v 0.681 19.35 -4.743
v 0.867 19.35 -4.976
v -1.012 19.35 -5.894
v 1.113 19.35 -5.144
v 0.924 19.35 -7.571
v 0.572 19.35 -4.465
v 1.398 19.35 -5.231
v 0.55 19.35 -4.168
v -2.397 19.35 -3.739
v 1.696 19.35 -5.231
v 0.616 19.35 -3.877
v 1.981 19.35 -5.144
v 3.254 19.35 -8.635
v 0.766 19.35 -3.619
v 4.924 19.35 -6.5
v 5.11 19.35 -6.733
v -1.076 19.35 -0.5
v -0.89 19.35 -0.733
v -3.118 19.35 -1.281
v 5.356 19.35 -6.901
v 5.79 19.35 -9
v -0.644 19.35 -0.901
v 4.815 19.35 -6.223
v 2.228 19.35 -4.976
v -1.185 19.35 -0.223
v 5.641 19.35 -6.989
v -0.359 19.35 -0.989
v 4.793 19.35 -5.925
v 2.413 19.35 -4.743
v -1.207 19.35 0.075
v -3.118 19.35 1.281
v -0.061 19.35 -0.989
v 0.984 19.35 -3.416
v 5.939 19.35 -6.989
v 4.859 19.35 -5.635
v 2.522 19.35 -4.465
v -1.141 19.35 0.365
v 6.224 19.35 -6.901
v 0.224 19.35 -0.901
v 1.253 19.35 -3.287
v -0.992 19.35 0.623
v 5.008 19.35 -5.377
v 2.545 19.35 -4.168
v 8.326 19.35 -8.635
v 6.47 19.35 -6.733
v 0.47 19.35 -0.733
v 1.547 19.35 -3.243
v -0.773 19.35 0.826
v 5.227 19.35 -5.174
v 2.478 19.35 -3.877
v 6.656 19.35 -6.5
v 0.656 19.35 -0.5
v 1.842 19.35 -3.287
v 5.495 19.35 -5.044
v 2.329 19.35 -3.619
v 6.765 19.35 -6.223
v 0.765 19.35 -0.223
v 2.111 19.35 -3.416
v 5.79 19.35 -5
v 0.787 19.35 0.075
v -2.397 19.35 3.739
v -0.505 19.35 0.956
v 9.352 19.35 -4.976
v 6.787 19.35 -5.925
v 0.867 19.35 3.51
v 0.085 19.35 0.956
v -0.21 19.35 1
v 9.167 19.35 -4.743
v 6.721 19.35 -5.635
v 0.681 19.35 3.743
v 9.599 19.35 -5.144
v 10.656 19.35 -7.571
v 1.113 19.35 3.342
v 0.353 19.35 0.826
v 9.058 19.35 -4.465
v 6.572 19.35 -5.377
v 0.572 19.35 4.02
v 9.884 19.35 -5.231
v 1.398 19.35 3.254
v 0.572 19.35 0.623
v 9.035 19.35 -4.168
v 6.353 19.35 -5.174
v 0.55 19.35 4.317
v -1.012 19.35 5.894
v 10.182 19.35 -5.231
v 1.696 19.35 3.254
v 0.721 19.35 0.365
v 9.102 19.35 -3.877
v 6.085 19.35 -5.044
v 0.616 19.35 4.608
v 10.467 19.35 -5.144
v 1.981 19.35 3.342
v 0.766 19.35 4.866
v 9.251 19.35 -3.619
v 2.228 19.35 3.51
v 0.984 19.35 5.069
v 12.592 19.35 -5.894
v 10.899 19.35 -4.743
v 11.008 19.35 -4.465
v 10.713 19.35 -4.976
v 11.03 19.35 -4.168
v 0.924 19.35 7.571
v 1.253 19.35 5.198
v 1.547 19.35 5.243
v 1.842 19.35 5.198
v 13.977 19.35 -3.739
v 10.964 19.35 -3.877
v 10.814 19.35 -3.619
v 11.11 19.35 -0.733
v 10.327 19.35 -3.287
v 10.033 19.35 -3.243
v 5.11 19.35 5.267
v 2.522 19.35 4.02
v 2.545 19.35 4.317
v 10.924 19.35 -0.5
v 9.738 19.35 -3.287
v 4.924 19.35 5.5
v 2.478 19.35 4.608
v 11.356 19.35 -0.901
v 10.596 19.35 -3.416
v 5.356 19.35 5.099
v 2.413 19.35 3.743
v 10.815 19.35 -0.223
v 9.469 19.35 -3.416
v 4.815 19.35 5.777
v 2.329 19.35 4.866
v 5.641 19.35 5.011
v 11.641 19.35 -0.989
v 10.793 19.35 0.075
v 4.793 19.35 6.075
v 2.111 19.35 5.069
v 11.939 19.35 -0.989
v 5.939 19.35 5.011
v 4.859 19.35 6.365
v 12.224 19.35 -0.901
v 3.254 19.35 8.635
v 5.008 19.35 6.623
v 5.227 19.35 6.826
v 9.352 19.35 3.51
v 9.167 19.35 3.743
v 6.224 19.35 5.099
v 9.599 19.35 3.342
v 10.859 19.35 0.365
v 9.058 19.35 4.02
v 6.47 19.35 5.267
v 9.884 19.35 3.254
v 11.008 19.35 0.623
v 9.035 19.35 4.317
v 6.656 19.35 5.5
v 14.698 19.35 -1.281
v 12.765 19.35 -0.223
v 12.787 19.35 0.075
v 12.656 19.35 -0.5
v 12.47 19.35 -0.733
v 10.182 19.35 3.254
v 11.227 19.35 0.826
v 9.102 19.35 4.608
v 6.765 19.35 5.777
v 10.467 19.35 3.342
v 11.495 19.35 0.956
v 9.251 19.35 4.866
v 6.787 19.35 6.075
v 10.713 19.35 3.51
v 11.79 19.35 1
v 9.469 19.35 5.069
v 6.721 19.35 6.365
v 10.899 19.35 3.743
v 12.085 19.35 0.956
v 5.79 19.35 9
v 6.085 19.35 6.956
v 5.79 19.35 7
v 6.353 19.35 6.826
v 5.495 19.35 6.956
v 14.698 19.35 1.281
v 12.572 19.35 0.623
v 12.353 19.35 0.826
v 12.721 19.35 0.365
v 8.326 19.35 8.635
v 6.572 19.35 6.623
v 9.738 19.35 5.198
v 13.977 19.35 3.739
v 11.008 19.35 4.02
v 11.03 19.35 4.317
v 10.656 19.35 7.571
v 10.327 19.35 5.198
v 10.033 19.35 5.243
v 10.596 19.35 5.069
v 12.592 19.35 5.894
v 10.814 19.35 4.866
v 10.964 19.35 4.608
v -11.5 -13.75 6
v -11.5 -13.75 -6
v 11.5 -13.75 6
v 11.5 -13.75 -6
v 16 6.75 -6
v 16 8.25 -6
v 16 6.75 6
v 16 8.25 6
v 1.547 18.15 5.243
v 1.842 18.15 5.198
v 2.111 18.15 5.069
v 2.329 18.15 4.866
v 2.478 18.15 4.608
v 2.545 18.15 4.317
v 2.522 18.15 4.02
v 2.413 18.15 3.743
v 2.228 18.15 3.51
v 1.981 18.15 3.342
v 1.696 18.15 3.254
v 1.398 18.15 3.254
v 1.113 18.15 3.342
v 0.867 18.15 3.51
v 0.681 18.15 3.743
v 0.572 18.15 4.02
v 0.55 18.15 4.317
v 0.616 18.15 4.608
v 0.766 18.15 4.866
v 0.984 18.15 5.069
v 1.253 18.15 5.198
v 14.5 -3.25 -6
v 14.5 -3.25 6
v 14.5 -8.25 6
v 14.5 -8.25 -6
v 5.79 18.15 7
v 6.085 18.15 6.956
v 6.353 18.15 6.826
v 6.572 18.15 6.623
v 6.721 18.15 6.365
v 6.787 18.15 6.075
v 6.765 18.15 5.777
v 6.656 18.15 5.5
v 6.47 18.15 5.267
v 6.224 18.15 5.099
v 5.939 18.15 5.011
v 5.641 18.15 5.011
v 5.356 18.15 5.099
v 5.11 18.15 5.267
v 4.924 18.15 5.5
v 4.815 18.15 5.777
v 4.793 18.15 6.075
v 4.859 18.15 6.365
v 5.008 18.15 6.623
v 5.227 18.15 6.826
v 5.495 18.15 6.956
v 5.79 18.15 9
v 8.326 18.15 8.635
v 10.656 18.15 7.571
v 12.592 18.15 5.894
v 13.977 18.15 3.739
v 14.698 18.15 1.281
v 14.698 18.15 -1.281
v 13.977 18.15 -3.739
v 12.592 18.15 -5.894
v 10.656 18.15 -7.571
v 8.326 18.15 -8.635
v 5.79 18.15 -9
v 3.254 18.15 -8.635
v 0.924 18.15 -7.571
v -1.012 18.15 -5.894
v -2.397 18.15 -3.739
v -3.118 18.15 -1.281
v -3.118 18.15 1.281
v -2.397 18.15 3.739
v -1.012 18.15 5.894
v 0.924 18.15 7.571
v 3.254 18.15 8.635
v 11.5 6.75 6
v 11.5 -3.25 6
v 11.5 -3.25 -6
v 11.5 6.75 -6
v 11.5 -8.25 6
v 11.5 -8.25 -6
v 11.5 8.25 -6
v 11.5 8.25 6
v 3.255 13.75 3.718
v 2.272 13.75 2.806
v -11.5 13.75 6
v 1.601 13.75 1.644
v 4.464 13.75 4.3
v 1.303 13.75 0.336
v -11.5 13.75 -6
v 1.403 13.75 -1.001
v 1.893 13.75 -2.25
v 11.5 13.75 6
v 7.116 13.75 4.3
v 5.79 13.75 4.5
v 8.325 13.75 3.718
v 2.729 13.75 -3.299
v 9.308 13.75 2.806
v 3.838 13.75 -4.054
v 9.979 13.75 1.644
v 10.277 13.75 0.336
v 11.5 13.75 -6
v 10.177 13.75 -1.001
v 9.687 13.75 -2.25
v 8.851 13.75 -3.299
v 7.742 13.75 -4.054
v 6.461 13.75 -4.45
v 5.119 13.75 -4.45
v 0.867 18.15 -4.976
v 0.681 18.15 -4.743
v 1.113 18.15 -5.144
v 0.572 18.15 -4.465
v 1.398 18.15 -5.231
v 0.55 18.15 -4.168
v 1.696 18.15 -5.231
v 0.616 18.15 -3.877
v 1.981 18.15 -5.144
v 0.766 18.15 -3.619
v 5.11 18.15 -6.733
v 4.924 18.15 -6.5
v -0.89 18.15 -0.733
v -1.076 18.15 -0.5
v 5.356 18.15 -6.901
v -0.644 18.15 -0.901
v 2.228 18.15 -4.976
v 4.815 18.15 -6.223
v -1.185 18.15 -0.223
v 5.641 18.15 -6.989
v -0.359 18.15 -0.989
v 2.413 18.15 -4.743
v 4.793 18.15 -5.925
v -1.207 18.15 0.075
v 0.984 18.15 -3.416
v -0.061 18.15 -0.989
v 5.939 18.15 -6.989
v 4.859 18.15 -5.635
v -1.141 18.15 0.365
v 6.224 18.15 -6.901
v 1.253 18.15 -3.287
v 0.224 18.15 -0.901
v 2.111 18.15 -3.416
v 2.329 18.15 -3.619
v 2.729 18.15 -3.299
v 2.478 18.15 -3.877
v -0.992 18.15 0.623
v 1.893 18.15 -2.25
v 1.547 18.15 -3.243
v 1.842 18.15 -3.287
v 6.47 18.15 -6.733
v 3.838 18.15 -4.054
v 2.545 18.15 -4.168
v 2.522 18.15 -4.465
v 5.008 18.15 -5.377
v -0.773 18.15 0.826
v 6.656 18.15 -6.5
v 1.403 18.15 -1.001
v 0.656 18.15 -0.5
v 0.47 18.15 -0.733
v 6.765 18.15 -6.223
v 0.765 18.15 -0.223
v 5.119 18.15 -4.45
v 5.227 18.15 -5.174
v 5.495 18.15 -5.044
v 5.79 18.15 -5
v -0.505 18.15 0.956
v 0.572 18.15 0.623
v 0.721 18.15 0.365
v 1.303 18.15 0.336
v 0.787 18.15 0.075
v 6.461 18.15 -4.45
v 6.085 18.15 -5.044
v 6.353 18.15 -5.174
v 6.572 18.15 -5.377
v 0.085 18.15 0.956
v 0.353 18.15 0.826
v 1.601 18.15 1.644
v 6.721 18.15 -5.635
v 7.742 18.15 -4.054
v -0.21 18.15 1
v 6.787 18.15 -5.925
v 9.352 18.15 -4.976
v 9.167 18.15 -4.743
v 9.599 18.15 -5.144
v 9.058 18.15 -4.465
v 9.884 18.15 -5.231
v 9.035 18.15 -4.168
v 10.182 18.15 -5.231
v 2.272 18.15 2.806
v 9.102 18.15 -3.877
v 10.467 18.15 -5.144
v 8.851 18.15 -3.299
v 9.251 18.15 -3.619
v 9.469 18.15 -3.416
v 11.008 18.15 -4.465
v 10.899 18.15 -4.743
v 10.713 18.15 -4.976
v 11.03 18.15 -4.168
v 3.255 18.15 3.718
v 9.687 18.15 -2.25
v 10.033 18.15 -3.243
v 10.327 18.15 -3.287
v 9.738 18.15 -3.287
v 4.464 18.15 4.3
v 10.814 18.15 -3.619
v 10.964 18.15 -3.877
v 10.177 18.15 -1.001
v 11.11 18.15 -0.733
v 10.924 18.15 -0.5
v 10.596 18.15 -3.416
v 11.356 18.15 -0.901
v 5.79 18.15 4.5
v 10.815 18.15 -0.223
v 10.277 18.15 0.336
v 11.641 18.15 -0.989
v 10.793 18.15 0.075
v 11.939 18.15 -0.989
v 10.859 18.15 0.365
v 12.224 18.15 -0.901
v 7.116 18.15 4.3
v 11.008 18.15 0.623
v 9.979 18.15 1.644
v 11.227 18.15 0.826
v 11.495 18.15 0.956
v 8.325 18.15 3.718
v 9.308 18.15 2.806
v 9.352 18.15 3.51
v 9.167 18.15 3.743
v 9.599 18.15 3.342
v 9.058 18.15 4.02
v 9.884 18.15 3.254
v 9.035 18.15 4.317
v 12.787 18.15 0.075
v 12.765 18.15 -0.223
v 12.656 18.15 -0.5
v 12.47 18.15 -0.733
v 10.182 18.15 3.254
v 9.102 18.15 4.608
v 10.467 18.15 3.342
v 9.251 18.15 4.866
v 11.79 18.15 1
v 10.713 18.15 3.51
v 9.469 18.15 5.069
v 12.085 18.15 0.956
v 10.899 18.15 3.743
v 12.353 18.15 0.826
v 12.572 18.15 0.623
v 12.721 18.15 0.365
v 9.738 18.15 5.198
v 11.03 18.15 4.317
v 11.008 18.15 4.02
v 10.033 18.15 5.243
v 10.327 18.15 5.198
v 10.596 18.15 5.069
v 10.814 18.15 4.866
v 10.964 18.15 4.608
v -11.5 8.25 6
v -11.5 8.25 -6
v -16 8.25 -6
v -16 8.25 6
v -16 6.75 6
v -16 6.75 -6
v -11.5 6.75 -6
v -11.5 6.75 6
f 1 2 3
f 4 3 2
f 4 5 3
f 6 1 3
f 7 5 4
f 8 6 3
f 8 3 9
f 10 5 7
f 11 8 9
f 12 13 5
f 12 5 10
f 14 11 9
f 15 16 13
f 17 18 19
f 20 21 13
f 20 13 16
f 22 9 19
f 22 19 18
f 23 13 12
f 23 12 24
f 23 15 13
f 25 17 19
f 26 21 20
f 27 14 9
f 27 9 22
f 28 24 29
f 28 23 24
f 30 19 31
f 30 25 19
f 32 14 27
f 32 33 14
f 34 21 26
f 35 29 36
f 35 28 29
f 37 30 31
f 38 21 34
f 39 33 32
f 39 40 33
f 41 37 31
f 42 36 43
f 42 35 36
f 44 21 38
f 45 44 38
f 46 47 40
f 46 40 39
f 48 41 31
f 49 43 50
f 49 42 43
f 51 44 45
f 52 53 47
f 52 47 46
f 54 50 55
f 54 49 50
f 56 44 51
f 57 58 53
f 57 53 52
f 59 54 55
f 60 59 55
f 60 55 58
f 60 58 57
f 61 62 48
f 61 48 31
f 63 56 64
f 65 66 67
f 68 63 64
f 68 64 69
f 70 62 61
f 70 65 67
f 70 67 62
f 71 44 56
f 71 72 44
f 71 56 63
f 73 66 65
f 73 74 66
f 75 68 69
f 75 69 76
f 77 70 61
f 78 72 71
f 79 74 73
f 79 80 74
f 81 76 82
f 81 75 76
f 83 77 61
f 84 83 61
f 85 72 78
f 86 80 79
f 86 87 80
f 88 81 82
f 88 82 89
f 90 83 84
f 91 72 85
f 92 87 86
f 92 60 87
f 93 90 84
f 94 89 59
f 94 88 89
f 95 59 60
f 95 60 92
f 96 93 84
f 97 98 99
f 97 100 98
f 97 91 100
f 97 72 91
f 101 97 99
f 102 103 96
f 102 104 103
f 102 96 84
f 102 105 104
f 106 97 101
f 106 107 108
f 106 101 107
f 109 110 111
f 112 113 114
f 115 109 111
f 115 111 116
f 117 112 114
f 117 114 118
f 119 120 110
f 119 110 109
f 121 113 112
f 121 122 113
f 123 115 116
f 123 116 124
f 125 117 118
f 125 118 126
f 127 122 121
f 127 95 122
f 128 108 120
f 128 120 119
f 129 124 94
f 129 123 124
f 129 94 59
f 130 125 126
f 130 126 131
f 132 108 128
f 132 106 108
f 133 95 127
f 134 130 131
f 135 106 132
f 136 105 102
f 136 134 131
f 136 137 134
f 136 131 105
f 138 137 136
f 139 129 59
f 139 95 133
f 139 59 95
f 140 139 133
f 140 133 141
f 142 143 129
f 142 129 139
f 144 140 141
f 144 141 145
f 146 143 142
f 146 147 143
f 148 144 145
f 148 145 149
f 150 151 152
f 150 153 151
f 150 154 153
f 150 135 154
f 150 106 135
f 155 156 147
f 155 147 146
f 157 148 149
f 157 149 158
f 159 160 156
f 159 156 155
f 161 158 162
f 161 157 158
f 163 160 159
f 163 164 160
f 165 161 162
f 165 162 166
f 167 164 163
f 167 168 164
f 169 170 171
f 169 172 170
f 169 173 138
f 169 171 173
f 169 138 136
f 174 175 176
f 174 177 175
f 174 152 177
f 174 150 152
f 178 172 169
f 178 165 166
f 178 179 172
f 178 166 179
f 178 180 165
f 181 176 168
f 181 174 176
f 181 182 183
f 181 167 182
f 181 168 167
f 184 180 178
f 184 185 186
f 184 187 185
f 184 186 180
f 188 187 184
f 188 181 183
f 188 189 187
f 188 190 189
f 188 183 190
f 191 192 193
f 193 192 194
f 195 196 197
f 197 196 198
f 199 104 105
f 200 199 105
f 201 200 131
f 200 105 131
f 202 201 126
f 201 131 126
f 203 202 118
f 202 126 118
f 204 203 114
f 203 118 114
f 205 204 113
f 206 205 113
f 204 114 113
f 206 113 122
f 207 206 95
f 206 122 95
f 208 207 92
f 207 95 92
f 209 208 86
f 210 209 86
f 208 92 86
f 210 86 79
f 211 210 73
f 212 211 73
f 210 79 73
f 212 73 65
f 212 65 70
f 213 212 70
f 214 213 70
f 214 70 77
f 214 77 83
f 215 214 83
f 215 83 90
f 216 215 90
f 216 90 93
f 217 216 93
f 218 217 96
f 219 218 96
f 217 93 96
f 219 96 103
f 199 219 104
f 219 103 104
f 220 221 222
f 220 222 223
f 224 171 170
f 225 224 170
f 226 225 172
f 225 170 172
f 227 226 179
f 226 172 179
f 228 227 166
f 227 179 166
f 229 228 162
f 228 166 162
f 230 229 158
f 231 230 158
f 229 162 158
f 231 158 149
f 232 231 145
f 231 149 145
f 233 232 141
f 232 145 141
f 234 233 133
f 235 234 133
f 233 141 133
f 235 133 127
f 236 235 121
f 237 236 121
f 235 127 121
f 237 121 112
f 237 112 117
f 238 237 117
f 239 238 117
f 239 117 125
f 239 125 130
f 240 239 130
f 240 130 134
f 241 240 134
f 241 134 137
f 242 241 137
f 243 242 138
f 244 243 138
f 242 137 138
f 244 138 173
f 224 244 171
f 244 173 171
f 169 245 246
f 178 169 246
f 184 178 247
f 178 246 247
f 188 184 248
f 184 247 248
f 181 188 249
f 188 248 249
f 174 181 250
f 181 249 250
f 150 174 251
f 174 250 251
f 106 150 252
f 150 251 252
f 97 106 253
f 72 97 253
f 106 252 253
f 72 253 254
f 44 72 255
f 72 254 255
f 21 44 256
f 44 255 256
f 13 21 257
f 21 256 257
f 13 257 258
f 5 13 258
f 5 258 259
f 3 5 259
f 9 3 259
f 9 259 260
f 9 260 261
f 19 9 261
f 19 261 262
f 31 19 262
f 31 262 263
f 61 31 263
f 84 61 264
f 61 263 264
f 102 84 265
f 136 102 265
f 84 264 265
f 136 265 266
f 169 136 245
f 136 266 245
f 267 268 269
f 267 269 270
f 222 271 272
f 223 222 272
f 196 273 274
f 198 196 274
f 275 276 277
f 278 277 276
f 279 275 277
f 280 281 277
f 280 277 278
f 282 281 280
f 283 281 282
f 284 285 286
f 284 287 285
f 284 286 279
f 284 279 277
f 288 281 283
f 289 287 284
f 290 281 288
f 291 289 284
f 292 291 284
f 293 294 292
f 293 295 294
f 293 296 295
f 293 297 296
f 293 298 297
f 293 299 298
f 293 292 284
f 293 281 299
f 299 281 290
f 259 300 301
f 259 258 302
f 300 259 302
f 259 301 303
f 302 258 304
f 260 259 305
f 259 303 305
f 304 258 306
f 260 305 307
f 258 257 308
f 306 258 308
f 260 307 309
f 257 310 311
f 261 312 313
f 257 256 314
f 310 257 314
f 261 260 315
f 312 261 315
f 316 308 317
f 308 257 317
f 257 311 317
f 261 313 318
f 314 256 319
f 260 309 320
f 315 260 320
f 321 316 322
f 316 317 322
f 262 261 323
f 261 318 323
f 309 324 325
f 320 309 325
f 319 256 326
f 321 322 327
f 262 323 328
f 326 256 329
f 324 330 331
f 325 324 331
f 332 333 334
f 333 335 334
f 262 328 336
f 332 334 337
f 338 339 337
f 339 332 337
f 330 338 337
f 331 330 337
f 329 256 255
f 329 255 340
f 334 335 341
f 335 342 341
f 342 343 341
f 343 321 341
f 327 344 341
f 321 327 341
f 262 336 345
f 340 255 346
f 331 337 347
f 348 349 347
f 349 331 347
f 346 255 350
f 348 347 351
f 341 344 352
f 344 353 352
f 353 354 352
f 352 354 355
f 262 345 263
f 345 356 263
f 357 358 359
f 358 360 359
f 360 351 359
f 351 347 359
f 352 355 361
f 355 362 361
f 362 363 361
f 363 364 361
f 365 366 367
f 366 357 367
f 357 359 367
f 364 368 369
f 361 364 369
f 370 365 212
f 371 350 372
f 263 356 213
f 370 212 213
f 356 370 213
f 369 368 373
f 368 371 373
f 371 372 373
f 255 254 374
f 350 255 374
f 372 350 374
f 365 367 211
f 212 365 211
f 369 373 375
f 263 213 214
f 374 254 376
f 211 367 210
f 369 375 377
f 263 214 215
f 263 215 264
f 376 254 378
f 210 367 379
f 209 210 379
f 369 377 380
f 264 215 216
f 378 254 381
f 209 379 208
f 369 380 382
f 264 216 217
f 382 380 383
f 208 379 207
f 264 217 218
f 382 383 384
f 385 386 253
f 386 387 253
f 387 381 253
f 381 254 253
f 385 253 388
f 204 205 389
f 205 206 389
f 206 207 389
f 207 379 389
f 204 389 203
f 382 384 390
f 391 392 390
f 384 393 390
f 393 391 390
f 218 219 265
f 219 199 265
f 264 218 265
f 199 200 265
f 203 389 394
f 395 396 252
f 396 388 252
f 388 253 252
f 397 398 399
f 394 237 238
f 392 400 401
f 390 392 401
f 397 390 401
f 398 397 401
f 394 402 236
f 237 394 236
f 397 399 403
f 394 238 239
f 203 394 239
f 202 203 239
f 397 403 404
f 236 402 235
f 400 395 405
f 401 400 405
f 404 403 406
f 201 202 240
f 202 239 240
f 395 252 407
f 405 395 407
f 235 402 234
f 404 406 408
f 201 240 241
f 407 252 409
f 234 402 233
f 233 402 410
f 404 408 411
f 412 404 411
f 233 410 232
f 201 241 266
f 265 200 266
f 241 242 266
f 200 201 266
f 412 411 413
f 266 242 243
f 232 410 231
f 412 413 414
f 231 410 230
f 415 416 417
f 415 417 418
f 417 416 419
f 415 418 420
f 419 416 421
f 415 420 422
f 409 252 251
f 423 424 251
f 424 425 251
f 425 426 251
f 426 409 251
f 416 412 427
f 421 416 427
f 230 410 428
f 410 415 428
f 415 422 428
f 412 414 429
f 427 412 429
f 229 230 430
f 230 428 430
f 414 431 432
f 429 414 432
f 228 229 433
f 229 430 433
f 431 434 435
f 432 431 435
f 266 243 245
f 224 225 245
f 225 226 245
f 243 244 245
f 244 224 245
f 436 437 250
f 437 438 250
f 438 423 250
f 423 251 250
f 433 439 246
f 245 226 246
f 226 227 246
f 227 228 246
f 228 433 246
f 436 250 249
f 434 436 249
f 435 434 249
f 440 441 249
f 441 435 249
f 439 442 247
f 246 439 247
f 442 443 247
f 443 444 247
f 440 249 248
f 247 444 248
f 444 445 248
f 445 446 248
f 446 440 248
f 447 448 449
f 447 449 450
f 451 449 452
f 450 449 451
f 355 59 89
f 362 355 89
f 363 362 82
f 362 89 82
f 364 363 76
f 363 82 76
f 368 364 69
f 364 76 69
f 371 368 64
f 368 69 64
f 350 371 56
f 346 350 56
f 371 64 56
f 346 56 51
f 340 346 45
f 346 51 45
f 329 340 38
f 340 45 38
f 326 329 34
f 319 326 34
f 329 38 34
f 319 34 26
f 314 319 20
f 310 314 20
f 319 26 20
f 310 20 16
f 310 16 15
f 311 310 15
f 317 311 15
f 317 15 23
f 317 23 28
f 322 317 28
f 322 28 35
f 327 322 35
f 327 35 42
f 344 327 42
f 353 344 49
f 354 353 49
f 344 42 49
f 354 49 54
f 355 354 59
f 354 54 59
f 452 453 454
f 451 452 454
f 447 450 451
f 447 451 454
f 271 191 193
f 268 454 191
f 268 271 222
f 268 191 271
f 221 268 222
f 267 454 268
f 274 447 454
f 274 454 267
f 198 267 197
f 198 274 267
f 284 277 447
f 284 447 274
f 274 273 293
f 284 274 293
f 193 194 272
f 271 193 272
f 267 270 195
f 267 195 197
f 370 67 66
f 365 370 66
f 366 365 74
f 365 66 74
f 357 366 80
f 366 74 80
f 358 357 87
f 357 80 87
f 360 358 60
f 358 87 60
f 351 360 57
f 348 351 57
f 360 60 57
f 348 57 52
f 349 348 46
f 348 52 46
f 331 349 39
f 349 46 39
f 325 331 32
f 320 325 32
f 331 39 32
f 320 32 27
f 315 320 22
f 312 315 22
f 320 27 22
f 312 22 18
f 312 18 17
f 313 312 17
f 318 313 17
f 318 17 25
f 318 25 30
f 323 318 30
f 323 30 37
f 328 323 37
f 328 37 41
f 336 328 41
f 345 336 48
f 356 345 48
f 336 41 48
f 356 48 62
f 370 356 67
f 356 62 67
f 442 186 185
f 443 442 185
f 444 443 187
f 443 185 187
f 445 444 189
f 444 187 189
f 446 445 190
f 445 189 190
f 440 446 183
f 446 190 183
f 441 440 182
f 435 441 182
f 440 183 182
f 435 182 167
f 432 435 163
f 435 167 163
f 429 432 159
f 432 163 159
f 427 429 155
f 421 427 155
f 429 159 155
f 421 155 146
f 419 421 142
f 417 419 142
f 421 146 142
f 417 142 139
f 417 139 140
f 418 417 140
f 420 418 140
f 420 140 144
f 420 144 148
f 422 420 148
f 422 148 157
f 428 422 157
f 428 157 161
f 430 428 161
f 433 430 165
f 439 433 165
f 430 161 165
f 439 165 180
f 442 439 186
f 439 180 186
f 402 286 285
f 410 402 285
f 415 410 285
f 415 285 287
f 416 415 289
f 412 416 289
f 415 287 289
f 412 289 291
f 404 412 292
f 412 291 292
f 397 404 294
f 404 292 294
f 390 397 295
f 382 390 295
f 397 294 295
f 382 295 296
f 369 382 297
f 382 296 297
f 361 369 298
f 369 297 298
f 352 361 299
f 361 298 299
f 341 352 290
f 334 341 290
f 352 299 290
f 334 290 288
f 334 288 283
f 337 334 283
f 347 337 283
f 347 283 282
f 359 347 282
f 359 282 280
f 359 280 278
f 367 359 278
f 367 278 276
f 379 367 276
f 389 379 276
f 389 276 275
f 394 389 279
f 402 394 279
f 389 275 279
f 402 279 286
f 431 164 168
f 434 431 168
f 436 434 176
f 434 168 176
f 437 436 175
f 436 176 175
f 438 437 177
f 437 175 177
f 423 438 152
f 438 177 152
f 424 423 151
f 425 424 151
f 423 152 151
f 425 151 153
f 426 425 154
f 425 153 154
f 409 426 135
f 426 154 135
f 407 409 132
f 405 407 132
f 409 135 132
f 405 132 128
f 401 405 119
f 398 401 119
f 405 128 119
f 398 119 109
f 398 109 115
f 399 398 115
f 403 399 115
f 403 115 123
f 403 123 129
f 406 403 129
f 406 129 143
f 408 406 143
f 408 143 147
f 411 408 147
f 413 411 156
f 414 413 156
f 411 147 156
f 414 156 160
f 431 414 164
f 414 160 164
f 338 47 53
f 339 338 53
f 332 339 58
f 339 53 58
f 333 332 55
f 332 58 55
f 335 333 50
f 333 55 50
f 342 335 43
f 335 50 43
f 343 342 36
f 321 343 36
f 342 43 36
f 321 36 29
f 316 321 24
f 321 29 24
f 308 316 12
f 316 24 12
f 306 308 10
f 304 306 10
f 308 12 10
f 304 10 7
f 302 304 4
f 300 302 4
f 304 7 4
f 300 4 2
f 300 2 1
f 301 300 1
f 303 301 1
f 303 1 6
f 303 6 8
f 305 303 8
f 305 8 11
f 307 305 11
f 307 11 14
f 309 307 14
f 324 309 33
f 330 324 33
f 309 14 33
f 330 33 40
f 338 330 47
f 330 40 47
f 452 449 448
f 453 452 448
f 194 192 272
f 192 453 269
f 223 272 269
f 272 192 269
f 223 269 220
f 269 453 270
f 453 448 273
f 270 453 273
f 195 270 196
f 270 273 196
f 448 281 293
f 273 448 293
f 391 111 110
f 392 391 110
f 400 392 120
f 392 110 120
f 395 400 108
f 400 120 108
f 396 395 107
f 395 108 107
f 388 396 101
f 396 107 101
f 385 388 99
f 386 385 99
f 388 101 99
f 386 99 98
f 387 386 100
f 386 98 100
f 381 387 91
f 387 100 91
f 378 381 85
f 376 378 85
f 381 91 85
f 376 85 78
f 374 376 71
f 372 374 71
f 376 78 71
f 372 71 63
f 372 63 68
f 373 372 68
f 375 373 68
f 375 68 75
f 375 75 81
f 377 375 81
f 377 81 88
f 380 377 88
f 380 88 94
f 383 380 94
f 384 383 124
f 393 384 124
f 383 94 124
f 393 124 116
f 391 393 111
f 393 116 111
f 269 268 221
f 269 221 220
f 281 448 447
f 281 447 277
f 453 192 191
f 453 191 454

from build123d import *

# Parameters (mm, degrees)
BOSS_EXTRUDE1_DEPTH      = 6
BOSS_EXTRUDE1_DEPTH_BACK = 6
SKETCH1_W                = 23
SKETCH1_H                = 27.5
SKETCH4_R                = 4.5
BOSS_EXTRUDE2_DEPTH      = 4.4
SKETCH5_R                = 9
BOSS_EXTRUDE3_DEPTH      = 1.2
SKETCH6_R                = 1
CUT_EXTRUDE1_DEPTH       = 1.2
SKETCH7_W                = 12
SKETCH7_H                = 1.5
BOSS_EXTRUDE4_DEPTH      = 4.5
SKETCH8_W                = 12
SKETCH8_H                = 5
BOSS_EXTRUDE5_DEPTH      = 3


with BuildPart() as part:
    # Sketch1 → Boss-Extrude1 (new, two sides: drawn at the far end of the back side and taken through both)
    with BuildSketch(Plane.XY.offset(-BOSS_EXTRUDE1_DEPTH_BACK)):
        Rectangle(SKETCH1_W, SKETCH1_H)
    extrude(amount=BOSS_EXTRUDE1_DEPTH + BOSS_EXTRUDE1_DEPTH_BACK)

    # Sketch4 → Boss-Extrude2 (add)
    with BuildSketch(Plane(origin=(0, 13.75, 0), x_dir=(1, 0, 0), z_dir=(0, 1, 0))):
        with Locations(Location((5.79, 0, 0), (0, 0, 270))):
            Circle(SKETCH4_R)
    extrude(amount=BOSS_EXTRUDE2_DEPTH)

    # Sketch5 → Boss-Extrude3 (add)
    with BuildSketch(Plane(origin=(0, 18.15, 0), x_dir=(1, 0, 0), z_dir=(0, 1, 0))):
        with Locations(Location((5.79, 0, 0), (0, 0, 270))):
            Circle(SKETCH5_R)
    extrude(amount=BOSS_EXTRUDE3_DEPTH)

    # Sketch6 → Cut-Extrude1 (cut)
    with BuildSketch(Plane(origin=(0, 19.35, 0), x_dir=(1, 0, 0), z_dir=(0, 1, 0))):
        with Locations(Location((5.79, 6, 0), (0, 0, 270))):
            Circle(SKETCH6_R)
        with Locations(Location((10.032640687, 4.242640687, 0), (0, 0, 270))):
            Circle(SKETCH6_R)
        with Locations(Location((11.79, 0, 0), (0, 0, 270))):
            Circle(SKETCH6_R)
        with Locations(Location((10.032640687, -4.242640687, 0), (0, 0, 270))):
            Circle(SKETCH6_R)
        with Locations(Location((5.79, -6, 0), (0, 0, 270))):
            Circle(SKETCH6_R)
        with Locations(Location((1.547359313, -4.242640687, 0), (0, 0, 270))):
            Circle(SKETCH6_R)
        with Locations(Location((-0.21, 0, 0), (0, 0, 270))):
            Circle(SKETCH6_R)
        with Locations(Location((1.547359313, 4.242640687, 0), (0, 0, 270))):
            Circle(SKETCH6_R)
    extrude(amount=-CUT_EXTRUDE1_DEPTH, mode=Mode.SUBTRACT)

    # Sketch7 → Boss-Extrude4 (add)
    with BuildSketch(Plane.ZY.offset(11.5)):
        with Locations((0, 7.5)):
            Rectangle(SKETCH7_W, SKETCH7_H)
    boss_extrude4 = extrude(amount=BOSS_EXTRUDE4_DEPTH)

    # Mirror1: Boss-Extrude4 across plane
    add(boss_extrude4.mirror(Plane(origin=(0, 0, 0), x_dir=(0, 0, 1), z_dir=(1, 0, 0))))

    # Sketch8 → Boss-Extrude5 (add)
    with BuildSketch(Plane(origin=(11.5, 0, 0), x_dir=(0, 0, -1), z_dir=(1, 0, 0))):
        with Locations((0, -5.75)):
            Rectangle(SKETCH8_W, SKETCH8_H)
    extrude(amount=BOSS_EXTRUDE5_DEPTH)


solid = part.part
